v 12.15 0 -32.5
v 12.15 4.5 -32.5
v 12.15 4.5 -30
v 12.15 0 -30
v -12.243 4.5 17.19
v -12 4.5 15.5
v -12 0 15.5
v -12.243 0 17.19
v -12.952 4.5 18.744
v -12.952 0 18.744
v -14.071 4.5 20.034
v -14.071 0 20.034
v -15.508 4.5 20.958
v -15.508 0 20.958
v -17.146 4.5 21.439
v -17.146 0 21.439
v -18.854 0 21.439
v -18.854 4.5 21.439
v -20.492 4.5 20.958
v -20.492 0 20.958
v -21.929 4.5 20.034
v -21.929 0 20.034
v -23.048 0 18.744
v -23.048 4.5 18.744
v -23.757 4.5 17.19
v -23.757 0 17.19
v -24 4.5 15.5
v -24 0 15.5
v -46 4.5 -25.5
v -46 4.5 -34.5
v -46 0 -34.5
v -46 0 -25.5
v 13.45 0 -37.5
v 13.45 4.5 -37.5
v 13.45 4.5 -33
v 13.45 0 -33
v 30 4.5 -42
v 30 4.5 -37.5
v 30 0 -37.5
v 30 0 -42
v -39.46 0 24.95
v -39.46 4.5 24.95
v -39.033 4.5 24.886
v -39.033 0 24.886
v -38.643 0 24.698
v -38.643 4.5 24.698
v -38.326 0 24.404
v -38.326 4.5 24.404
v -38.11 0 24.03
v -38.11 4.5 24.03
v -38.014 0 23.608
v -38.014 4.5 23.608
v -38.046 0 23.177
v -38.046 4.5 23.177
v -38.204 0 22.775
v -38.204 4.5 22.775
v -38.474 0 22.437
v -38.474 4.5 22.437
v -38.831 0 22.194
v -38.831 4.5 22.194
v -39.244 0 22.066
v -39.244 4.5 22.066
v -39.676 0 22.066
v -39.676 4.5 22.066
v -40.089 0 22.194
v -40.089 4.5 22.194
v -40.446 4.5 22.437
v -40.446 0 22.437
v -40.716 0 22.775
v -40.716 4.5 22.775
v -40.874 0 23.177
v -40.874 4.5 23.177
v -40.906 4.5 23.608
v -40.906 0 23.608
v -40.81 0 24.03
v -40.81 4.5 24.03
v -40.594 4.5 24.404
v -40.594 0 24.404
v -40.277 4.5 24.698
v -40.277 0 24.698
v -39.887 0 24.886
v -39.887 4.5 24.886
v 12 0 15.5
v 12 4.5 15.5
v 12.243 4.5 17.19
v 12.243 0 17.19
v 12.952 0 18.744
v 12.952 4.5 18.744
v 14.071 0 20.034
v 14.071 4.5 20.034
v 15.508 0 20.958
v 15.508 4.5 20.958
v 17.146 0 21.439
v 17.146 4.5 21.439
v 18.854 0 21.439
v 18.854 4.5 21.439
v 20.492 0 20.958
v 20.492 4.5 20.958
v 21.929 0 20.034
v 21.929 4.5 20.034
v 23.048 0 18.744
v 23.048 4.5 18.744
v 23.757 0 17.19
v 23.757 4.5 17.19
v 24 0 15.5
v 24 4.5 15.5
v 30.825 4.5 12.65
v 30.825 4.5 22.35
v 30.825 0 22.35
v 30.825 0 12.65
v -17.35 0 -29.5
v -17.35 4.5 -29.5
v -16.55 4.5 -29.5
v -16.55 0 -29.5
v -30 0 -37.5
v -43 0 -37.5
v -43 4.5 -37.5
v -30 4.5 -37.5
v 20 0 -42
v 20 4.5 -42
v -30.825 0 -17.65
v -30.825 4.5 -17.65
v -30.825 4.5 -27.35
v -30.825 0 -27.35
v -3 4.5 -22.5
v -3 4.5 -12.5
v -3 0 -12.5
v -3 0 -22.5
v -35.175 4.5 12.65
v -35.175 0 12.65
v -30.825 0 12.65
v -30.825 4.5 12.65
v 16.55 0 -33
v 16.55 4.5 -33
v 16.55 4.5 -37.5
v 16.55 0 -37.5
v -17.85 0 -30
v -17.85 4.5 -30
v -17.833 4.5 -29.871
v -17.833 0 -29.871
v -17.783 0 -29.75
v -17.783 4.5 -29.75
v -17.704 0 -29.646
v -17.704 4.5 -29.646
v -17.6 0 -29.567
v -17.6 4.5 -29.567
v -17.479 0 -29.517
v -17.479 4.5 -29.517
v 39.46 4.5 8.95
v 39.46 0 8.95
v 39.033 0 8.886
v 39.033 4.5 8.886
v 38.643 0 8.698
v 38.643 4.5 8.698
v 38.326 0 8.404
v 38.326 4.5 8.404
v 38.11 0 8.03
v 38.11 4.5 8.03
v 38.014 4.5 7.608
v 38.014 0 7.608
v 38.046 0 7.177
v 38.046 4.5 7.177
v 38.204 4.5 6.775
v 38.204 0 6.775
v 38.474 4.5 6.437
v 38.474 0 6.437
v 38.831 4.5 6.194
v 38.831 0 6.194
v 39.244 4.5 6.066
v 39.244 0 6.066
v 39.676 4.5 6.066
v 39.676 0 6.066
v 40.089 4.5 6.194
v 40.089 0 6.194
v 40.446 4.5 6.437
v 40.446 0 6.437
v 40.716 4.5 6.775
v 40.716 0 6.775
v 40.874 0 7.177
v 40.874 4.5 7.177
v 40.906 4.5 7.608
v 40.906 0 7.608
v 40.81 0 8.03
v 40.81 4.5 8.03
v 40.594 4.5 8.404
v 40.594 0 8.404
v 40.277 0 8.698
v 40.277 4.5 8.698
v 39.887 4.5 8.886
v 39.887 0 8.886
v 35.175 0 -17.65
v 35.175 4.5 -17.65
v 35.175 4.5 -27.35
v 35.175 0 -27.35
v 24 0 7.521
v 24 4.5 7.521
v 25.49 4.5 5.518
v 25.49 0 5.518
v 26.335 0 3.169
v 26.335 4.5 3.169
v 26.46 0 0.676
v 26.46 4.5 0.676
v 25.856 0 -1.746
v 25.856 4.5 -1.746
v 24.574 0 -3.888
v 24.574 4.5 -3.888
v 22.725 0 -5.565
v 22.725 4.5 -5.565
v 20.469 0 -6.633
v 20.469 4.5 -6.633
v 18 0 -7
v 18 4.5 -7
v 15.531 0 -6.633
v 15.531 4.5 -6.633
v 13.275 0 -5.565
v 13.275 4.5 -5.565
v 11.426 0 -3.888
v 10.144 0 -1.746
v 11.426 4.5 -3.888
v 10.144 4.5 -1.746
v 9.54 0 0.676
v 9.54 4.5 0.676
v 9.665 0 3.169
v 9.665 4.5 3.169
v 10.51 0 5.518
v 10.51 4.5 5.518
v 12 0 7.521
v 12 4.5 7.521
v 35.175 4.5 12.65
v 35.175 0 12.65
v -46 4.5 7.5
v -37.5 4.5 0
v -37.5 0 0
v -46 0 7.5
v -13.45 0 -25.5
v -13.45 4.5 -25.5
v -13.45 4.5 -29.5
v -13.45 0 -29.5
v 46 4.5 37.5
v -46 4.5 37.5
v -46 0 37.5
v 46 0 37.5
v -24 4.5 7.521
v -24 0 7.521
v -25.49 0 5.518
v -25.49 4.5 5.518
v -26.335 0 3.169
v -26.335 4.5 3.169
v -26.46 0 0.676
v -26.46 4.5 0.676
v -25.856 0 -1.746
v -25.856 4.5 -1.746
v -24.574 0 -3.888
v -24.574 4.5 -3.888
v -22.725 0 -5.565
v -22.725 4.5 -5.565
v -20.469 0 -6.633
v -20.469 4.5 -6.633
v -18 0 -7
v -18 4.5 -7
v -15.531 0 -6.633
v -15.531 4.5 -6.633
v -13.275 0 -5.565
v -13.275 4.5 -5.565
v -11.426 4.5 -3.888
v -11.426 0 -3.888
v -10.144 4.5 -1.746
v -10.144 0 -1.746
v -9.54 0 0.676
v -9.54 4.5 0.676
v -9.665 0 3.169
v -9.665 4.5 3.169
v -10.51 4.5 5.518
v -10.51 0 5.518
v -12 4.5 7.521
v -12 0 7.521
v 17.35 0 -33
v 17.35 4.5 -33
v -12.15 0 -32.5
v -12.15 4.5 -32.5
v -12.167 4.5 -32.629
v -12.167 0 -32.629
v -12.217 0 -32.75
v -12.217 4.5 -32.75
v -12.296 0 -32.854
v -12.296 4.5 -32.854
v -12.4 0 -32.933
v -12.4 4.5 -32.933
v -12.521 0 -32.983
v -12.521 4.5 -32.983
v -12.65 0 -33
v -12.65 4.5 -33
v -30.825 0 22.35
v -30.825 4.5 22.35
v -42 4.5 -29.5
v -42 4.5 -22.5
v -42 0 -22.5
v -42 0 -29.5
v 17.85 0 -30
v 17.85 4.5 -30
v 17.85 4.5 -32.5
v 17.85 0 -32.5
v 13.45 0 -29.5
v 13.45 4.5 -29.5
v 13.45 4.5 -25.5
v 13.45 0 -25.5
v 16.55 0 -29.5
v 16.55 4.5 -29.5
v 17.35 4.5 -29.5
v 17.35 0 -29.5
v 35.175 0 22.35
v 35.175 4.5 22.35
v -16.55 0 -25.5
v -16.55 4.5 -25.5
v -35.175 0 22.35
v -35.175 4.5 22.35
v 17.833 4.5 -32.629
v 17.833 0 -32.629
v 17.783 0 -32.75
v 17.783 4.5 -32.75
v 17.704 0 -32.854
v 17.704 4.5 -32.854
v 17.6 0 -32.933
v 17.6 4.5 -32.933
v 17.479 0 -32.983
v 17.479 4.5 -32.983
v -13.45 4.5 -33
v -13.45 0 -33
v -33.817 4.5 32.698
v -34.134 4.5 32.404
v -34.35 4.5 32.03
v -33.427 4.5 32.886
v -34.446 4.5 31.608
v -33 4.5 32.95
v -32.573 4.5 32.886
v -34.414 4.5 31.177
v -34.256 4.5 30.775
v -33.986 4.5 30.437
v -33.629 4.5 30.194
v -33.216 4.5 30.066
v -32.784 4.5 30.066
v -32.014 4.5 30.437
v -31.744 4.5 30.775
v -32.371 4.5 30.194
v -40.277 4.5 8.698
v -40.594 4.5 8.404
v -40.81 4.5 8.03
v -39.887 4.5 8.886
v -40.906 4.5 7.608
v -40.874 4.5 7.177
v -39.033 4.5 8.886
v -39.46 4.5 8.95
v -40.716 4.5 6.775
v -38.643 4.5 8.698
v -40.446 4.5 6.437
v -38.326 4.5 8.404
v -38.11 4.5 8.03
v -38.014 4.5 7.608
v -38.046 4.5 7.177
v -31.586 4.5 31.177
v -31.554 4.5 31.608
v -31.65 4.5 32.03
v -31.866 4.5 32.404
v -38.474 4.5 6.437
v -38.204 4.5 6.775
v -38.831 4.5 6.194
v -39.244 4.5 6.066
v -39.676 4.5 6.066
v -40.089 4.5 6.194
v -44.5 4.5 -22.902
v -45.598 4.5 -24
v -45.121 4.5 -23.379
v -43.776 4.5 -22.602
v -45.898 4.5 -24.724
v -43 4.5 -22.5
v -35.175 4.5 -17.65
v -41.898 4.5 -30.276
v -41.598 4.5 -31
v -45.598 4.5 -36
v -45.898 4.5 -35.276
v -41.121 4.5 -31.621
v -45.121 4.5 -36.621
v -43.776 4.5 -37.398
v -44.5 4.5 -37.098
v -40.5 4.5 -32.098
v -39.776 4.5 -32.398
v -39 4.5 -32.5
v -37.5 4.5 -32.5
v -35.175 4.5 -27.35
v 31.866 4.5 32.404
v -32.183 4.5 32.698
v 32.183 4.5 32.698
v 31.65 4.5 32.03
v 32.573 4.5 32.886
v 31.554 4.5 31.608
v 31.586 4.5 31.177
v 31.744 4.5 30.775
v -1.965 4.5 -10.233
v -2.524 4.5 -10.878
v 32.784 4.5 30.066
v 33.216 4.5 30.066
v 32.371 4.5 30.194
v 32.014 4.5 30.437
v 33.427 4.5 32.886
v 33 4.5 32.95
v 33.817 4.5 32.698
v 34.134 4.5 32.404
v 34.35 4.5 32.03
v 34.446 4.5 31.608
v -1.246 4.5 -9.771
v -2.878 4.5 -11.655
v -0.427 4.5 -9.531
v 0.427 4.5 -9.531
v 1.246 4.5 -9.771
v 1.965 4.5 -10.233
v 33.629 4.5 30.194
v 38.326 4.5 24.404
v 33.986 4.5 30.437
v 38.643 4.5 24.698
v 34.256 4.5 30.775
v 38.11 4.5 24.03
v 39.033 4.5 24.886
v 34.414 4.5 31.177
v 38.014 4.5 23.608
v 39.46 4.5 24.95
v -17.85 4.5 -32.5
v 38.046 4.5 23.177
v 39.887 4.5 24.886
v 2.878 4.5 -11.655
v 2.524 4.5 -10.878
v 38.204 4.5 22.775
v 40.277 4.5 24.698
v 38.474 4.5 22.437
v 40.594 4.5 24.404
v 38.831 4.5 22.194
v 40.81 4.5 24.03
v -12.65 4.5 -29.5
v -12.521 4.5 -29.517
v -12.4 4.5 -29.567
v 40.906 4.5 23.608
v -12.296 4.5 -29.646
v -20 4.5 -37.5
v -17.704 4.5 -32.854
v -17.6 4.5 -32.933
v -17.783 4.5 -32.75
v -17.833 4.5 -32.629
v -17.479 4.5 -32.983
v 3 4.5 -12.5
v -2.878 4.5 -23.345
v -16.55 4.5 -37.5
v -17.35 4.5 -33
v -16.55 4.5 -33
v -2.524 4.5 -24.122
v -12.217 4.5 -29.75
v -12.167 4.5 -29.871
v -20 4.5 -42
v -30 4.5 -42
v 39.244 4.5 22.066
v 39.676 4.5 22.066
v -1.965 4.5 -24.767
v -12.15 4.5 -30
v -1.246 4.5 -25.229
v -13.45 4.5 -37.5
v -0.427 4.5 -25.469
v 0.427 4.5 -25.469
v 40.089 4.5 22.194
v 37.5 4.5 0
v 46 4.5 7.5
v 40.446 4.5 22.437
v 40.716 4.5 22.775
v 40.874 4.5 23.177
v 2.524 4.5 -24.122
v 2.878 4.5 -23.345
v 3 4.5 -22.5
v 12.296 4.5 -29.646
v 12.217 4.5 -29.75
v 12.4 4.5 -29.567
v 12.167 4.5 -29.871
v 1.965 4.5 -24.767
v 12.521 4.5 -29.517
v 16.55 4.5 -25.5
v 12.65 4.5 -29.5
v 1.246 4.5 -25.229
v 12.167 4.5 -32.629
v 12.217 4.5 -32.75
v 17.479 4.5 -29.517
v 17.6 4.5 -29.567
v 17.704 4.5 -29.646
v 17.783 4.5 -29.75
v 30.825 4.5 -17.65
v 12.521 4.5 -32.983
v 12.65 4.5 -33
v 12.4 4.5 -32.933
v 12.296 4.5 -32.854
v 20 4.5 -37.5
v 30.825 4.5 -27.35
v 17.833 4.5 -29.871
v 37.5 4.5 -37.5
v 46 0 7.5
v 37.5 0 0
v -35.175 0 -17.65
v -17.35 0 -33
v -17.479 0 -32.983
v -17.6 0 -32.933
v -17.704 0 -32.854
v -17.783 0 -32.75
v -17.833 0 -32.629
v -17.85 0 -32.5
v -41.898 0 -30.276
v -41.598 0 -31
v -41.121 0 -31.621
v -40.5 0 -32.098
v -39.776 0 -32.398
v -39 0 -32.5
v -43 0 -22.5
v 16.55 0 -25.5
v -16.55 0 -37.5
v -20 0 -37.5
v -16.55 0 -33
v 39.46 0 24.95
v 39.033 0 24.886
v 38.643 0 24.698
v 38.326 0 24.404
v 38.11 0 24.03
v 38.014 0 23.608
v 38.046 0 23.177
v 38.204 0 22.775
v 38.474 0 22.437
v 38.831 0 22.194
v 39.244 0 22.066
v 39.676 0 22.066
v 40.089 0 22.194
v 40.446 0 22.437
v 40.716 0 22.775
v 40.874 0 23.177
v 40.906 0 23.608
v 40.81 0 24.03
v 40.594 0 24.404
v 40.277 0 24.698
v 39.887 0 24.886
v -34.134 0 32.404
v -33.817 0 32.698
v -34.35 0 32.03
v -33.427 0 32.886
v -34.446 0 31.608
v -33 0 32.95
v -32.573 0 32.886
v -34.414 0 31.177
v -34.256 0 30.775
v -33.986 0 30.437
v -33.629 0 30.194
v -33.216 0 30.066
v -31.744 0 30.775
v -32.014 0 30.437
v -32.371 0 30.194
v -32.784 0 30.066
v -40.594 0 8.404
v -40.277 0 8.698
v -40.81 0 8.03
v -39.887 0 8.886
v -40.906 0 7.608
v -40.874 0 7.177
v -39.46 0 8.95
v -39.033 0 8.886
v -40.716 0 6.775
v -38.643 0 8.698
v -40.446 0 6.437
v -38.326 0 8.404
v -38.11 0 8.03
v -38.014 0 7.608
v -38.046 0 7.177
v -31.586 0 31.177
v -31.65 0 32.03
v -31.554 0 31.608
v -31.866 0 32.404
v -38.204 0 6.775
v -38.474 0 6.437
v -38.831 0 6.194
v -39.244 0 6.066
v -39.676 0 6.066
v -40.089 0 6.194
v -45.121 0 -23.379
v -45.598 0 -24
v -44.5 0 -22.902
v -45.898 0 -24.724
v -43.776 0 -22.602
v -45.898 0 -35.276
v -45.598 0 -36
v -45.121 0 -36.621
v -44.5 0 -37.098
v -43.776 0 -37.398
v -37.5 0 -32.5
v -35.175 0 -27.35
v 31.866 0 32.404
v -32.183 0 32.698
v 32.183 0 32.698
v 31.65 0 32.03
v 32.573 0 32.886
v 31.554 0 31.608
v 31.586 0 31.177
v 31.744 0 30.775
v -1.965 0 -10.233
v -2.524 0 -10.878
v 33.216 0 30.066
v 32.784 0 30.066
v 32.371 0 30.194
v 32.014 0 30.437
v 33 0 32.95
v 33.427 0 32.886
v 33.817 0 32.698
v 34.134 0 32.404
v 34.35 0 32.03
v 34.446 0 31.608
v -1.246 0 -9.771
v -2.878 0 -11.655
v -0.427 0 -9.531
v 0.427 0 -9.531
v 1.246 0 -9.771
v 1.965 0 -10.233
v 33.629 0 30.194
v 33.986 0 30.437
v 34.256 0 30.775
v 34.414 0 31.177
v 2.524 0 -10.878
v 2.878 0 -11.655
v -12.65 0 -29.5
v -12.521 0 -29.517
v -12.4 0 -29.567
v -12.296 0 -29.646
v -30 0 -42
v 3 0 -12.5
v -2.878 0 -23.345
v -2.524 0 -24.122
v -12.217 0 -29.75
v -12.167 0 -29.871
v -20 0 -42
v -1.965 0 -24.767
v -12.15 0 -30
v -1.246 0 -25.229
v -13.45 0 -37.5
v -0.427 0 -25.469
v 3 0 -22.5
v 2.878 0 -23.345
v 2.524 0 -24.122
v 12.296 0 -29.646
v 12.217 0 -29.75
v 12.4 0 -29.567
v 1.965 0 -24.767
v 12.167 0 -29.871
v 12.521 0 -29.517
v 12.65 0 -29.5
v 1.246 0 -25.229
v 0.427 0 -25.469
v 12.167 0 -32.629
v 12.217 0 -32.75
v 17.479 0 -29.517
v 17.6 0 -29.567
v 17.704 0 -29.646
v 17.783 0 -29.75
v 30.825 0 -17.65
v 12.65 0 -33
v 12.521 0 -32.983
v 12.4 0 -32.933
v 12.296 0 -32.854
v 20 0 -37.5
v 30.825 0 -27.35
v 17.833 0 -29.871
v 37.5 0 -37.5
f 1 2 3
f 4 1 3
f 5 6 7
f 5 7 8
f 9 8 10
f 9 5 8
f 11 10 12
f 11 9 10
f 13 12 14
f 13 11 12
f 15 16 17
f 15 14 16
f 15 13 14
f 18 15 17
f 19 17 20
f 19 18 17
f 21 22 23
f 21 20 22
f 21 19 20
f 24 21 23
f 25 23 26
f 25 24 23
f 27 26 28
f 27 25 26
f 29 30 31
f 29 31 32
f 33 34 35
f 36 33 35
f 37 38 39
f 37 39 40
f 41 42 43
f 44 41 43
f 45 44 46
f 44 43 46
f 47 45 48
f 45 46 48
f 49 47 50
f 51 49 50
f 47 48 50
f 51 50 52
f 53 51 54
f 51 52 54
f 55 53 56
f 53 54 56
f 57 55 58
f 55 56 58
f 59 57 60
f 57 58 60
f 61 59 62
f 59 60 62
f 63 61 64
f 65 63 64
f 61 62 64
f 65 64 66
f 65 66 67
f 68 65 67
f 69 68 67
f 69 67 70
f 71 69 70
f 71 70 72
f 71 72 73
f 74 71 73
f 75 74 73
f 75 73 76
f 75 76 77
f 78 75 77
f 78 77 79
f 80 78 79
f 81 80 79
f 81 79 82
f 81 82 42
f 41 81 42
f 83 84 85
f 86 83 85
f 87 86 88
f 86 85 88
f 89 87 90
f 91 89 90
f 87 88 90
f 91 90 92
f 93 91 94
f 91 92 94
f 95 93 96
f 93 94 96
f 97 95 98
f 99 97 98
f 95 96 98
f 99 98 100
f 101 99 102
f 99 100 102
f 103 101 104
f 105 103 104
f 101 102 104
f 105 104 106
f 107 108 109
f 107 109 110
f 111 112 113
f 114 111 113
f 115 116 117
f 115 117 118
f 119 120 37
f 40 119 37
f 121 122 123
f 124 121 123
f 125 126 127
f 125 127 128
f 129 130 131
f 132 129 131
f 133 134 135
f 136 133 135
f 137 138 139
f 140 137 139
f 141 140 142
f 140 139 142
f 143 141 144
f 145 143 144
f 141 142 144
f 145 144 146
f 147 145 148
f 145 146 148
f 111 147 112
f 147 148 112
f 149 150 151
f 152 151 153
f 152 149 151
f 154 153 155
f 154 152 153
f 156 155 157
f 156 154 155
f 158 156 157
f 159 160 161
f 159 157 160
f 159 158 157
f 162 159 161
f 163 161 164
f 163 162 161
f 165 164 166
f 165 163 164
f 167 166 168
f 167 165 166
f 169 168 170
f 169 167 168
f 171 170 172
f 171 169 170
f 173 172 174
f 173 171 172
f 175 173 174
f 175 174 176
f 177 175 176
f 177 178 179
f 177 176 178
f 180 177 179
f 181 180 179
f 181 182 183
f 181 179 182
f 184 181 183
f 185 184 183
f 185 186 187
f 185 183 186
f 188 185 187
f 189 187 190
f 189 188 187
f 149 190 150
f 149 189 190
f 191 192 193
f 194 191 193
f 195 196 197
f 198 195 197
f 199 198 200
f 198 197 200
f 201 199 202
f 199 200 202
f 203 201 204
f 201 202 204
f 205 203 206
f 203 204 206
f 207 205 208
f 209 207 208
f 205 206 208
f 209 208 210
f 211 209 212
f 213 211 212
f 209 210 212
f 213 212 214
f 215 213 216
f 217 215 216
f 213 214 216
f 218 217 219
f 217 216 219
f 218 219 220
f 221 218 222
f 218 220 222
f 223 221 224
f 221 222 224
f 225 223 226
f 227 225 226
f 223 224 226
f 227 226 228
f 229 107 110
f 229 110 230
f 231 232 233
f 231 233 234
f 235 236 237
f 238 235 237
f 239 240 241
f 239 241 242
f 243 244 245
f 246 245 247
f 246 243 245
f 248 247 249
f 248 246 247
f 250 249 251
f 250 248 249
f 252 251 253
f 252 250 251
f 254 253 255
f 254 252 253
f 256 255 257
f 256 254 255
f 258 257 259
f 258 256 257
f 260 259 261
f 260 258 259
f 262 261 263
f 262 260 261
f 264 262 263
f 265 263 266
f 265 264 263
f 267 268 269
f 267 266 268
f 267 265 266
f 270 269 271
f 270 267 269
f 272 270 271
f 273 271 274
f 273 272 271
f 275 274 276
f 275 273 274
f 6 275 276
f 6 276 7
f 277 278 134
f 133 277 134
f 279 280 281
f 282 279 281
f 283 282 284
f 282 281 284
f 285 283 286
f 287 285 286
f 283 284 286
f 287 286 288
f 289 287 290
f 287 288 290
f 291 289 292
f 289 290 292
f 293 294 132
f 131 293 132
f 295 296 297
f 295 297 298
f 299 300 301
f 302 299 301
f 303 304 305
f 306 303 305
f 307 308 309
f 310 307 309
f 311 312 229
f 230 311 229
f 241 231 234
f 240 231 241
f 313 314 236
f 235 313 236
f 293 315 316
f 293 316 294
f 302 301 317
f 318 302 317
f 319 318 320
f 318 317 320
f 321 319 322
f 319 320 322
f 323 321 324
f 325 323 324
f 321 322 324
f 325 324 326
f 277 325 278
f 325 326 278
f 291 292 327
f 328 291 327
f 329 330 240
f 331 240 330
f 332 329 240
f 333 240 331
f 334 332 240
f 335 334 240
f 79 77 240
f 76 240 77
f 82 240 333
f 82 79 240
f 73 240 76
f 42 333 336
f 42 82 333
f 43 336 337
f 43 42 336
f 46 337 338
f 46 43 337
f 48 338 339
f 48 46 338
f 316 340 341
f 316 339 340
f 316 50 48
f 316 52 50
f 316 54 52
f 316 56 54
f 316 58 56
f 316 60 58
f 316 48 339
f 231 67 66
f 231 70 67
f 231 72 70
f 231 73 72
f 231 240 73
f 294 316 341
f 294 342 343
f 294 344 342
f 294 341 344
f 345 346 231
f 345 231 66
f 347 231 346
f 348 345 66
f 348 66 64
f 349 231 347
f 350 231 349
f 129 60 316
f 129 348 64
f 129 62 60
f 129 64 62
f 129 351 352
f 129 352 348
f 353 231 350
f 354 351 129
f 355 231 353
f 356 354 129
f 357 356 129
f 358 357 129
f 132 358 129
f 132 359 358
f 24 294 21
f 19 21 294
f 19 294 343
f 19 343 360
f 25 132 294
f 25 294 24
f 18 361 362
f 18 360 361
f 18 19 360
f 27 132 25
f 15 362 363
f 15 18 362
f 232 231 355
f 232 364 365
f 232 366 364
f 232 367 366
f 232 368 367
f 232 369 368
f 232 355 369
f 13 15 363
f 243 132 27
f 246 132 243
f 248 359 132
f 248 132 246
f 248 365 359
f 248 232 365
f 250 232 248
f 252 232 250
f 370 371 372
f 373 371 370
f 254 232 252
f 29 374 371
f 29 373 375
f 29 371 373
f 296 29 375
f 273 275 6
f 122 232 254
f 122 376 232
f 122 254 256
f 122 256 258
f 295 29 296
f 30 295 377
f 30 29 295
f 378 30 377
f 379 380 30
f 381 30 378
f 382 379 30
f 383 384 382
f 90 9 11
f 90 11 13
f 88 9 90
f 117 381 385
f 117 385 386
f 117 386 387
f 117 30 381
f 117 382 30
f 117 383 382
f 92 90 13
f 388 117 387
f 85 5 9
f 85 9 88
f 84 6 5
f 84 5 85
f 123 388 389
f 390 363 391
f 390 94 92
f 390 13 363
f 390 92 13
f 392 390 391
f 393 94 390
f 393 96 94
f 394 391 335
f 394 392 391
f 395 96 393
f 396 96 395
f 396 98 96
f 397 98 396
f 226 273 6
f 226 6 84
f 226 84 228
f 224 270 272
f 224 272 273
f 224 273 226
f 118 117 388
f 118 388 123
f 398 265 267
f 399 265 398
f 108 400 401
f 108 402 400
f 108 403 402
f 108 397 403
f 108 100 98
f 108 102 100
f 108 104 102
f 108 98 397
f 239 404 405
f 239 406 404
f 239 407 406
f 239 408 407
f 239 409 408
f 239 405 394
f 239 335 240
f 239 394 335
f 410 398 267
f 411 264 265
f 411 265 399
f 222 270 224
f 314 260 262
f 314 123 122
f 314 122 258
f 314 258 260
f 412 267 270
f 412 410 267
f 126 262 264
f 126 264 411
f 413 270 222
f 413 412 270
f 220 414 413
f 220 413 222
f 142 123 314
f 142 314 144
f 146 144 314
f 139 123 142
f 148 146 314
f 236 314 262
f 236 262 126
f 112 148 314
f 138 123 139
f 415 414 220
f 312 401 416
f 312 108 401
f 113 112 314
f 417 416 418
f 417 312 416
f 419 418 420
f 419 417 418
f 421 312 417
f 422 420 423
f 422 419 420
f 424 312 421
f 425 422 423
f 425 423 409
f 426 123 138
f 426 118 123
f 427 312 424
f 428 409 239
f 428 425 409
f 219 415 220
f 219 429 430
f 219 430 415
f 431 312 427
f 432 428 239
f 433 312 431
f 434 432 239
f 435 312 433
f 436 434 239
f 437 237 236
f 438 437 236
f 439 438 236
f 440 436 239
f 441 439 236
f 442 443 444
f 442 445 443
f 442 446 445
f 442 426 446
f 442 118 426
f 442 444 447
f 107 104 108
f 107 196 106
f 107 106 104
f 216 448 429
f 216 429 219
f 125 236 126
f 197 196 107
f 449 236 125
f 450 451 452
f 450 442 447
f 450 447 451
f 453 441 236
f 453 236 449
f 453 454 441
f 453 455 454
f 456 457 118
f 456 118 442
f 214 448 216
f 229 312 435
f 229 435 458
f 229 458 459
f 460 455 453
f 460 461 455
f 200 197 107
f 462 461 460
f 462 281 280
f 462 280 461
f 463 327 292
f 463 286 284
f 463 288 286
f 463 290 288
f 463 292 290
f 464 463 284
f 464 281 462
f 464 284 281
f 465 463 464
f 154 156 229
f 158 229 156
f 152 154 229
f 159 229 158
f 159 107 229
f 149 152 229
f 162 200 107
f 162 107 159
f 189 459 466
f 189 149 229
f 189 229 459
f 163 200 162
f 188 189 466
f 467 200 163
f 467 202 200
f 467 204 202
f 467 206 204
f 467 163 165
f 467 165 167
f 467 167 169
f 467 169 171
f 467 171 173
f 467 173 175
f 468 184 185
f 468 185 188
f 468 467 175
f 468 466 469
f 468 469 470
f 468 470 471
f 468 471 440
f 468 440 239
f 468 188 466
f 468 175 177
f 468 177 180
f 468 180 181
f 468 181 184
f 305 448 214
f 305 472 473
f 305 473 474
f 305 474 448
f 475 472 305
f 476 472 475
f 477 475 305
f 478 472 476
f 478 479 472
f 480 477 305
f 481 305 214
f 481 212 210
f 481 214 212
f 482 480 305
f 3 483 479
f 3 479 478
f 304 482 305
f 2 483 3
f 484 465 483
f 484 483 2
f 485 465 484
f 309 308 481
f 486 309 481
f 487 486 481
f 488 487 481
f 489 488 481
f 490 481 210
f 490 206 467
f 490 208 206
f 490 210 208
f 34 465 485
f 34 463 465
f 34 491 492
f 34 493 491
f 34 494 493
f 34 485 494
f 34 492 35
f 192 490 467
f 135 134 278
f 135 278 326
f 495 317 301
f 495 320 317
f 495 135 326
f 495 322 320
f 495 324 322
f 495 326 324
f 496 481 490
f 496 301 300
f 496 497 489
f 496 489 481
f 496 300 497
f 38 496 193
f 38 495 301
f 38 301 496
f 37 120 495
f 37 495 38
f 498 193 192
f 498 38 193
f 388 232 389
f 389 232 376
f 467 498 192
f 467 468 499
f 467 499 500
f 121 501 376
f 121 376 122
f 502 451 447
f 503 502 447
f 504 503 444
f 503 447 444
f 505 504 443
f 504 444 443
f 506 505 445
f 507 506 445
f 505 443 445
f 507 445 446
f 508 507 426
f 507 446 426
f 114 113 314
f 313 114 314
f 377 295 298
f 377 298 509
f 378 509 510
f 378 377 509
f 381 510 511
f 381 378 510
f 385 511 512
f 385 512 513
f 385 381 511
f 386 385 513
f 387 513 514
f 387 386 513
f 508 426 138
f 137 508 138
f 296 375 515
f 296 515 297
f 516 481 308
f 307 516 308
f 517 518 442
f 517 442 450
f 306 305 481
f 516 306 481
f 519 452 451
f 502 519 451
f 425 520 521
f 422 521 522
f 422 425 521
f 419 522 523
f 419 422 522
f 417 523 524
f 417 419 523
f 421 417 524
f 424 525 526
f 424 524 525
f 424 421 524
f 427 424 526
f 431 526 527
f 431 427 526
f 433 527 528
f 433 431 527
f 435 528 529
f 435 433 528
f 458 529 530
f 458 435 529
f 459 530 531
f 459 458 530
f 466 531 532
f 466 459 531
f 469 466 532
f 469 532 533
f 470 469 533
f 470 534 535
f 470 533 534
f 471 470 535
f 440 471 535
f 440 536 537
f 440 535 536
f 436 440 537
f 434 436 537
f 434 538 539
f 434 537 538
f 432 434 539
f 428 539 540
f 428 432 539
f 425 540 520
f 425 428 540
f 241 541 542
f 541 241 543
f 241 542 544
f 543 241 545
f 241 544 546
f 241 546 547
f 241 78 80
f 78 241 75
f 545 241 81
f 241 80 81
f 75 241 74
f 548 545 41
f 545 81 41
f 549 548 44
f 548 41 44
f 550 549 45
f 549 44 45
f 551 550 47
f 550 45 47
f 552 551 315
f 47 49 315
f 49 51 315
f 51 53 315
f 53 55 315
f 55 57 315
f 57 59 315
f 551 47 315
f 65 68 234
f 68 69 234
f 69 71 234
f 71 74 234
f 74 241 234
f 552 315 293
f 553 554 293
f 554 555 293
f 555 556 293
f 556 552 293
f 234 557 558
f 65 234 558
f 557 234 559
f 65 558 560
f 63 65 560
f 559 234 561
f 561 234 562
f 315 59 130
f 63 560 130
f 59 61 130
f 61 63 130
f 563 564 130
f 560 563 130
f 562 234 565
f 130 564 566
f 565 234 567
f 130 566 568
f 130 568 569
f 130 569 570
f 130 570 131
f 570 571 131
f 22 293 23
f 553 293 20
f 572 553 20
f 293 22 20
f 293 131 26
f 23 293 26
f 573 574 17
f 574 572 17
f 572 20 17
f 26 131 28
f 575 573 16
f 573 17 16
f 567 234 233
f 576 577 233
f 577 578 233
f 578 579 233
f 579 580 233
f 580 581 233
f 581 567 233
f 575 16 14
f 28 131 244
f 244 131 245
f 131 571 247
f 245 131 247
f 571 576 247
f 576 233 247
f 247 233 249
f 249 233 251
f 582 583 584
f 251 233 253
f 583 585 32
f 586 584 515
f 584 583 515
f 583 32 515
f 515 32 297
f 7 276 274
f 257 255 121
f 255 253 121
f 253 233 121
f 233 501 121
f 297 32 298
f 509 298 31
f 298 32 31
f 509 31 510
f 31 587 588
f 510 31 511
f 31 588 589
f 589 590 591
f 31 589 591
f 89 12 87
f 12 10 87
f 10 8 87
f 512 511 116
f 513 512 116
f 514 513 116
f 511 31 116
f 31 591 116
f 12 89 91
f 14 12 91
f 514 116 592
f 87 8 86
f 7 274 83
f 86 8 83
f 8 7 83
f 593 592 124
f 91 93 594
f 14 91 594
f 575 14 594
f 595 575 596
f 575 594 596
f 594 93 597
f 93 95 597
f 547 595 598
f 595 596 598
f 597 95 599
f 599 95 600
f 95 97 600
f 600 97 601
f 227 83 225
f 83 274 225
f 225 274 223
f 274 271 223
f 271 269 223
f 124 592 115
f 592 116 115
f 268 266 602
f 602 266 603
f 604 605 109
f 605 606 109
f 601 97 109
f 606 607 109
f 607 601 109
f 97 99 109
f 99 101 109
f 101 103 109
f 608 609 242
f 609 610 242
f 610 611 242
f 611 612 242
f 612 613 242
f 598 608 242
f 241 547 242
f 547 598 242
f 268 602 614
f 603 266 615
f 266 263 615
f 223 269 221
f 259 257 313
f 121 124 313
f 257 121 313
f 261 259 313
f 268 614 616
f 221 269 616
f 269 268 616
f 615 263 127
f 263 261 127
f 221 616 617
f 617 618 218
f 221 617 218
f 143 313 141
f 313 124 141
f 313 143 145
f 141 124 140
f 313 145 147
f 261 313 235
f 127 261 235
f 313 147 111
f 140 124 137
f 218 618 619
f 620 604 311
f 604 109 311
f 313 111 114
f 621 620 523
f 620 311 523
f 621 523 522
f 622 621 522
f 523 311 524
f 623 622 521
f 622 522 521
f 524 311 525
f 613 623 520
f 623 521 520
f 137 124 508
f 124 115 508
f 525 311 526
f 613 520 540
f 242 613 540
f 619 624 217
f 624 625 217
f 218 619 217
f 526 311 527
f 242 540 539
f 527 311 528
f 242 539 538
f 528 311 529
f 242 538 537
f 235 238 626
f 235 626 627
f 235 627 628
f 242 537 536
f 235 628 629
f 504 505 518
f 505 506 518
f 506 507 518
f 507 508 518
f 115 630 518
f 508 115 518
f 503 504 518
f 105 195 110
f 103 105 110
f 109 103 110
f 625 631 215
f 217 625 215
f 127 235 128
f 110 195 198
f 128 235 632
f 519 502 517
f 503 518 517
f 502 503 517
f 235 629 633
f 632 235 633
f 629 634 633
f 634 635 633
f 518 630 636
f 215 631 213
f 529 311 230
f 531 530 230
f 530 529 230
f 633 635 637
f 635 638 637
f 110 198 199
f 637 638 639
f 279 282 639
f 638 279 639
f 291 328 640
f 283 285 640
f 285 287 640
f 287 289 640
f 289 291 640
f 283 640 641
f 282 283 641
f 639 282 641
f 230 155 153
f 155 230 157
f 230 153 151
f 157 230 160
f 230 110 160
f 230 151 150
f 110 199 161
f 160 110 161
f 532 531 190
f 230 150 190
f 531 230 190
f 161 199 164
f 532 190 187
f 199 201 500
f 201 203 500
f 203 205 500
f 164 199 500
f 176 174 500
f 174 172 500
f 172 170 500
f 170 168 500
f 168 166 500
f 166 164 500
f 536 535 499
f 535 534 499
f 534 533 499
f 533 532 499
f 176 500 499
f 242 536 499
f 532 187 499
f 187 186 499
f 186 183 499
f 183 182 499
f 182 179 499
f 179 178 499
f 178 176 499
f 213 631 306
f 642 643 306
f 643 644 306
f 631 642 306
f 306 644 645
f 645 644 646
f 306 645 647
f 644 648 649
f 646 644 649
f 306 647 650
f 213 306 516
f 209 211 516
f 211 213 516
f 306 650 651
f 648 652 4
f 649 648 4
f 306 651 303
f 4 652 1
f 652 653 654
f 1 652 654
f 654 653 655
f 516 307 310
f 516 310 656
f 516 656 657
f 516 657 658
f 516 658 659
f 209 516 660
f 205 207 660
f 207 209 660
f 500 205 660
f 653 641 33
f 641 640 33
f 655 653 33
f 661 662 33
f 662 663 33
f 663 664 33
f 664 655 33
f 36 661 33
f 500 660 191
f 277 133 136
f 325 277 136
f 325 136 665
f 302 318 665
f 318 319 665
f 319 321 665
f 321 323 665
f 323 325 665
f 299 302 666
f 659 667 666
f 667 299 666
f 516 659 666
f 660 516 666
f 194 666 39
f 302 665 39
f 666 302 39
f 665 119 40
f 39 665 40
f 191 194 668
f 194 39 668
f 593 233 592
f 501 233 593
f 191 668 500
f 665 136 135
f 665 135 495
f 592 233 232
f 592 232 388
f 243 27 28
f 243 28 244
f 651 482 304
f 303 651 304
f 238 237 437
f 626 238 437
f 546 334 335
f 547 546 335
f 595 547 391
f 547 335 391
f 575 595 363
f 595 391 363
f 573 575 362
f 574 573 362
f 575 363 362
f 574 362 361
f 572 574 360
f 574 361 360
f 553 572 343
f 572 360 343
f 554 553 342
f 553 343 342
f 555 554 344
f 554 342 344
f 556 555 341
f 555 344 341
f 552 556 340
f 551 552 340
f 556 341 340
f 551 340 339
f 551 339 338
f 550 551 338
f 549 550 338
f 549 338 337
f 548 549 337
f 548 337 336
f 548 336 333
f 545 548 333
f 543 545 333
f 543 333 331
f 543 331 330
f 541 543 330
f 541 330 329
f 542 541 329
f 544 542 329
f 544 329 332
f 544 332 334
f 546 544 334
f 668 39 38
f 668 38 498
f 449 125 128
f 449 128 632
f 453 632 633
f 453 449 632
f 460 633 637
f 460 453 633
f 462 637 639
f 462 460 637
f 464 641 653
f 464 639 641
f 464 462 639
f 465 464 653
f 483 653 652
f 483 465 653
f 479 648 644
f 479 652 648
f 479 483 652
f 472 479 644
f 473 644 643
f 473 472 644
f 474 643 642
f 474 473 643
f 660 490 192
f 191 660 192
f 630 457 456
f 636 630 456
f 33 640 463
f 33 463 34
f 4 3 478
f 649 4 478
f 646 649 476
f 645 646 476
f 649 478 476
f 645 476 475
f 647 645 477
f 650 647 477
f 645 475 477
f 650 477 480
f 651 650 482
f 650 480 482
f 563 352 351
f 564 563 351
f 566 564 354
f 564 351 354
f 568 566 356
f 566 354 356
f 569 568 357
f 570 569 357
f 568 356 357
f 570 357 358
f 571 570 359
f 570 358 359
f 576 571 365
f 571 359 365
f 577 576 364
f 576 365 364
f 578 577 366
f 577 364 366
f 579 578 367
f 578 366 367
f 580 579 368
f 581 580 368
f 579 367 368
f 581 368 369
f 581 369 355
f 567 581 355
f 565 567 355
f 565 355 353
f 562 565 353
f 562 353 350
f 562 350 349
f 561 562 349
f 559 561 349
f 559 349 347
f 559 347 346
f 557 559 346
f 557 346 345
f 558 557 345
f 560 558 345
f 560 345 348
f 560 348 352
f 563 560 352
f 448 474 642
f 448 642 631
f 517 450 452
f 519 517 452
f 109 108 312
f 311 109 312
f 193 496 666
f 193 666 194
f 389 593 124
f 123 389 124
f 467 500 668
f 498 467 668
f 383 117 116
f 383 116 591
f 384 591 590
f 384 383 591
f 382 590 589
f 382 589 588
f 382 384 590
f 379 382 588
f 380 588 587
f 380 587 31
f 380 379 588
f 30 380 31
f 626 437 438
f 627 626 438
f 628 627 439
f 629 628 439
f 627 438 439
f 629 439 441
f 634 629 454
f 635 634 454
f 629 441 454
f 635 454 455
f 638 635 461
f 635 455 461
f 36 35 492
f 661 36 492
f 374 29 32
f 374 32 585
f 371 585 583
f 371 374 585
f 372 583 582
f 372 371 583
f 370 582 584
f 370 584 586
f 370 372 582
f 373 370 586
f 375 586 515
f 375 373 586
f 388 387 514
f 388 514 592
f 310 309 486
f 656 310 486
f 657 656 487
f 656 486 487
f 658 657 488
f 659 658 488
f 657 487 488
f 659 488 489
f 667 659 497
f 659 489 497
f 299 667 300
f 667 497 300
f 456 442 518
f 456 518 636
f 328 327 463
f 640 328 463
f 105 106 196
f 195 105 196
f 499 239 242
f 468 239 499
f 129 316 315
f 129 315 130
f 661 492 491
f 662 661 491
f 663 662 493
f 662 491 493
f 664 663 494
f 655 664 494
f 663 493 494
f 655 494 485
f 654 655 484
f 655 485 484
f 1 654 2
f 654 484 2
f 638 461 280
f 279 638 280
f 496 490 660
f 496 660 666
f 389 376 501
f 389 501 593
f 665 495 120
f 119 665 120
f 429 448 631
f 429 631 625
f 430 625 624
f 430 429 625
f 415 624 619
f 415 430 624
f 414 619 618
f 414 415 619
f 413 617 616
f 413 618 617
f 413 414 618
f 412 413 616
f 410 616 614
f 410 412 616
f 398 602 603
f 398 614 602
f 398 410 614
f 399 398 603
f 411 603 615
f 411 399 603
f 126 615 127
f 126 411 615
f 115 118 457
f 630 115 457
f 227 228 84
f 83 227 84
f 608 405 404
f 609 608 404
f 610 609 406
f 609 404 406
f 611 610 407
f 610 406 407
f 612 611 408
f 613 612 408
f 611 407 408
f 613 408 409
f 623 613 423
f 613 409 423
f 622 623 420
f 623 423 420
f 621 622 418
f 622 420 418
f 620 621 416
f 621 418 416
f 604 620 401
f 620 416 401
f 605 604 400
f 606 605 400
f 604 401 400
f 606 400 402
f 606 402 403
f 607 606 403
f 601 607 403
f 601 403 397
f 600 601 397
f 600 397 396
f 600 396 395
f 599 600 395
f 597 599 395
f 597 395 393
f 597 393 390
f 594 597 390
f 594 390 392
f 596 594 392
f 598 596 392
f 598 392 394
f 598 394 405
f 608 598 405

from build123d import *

# Parameters (mm, degrees)
SKETCH1_W            = 75
SKETCH1_H            = 75
MAINSHAPE_DEPTH      = 4.5
SKETCH5_W            = 4.35
SKETCH5_H            = 9.7
CUT_EXTRUDE3_DEPTH   = 54.223584998
CUT_EXTRUDE4_DEPTH   = 54.223584998
BOSS_EXTRUDE2_DEPTH  = 4.5
SKETCH8_R            = 1.45
CUT_EXTRUDE6_DEPTH   = 60.51890456
SKETCH11_W           = 10
SKETCH11_H           = 4.5
REARTABS_DEPTH       = 4.5
FRONTSCREWSLOT_DEPTH = 63.451981554
SKETCH14_R           = 1.45
BRACESCREWS_DEPTH    = 63.451981554
WIRINGSLOT_DEPTH     = 63.451981554
BOSS_EXTRUDE4_DEPTH  = 4.5


with BuildPart() as part:
    # Sketch1 → MainShape (new body)
    with BuildSketch(Plane(origin=(0, 0, 0), x_dir=(1, 0, 0), z_dir=(0, 1, 0))):
        Rectangle(SKETCH1_W, SKETCH1_H)
    extrude(amount=MAINSHAPE_DEPTH)

    # Sketch5 → Cut-Extrude3 (cut, through all)
    with BuildSketch(Plane(origin=(0, 4.5, 0), x_dir=(1, 0, 0), z_dir=(0, 1, 0))):
        with Locations((33, 22.5)):
            Rectangle(SKETCH5_W, SKETCH5_H)
        with Locations((-33, 22.5)):
            Rectangle(SKETCH5_W, SKETCH5_H)
        with Locations((-33, -17.5)):
            Rectangle(SKETCH5_W, SKETCH5_H)
        with Locations((33, -17.5)):
            Rectangle(SKETCH5_W, SKETCH5_H)
    extrude(amount=-CUT_EXTRUDE3_DEPTH, mode=Mode.SUBTRACT)

    # Sketch6 → Cut-Extrude4 (cut, through all)
    with BuildSketch(Plane(origin=(0, 4.5, 0), x_dir=(1, 0, 0), z_dir=(0, 1, 0))):
        with BuildLine():
            Line((-24, -15.5), (-24, -7.520797289))
            ThreePointArc((-24, -7.520797289), (-18, 7), (-12, -7.520797289))
            Line((-12, -7.520797289), (-12, -15.5))
            ThreePointArc((-12, -15.5), (-18, -21.5), (-24, -15.5))
        make_face()
    cut_extrude4 = extrude(amount=-CUT_EXTRUDE4_DEPTH, mode=Mode.SUBTRACT)

    # Sketch13 → Boss-Extrude2 (add, through all)
    with BuildSketch(Plane(origin=(0, 4.5, 0), x_dir=(1, 0, 0), z_dir=(0, 1, 0))):
        Polygon((-37.5, -37.5), (-37.5, 0), (-46, -7.5), (-46, -37.5), align=None)
        Polygon((37.5, 0), (37.5, -37.5), (46, -37.5), (46, -7.5), align=None)
    extrude(amount=-BOSS_EXTRUDE2_DEPTH)

    # Sketch8 → Cut-Extrude6 (cut, through all)
    with BuildSketch(Plane(origin=(0, 4.5, 0), x_dir=(1, 0, 0), z_dir=(0, 1, 0))):
        with Locations(Location((-39.46, -7.5, 0), (0, 0, 270))):
            Circle(SKETCH8_R)
        with Locations(Location((-39.46, -23.5, 0), (0, 0, 270))):
            Circle(SKETCH8_R)
    cut_extrude6 = extrude(amount=-CUT_EXTRUDE6_DEPTH, mode=Mode.SUBTRACT)

    # Mirror1: Cut-Extrude4, Cut-Extrude6 across plane
    add(cut_extrude4.mirror(Plane(origin=(0, 0, 0), x_dir=(0, 0, 1), z_dir=(1, 0, 0))), mode=Mode.SUBTRACT)
    add(cut_extrude6.mirror(Plane(origin=(0, 0, 0), x_dir=(0, 0, 1), z_dir=(1, 0, 0))), mode=Mode.SUBTRACT)

    # Sketch11 → RearTabs (add, through all)
    with BuildSketch(Plane(origin=(0, 4.5, 0), x_dir=(1, 0, 0), z_dir=(0, 1, 0))):
        with Locations((-25, 39.75)):
            Rectangle(SKETCH11_W, SKETCH11_H)
        with Locations((25, 39.75)):
            Rectangle(SKETCH11_W, SKETCH11_H)
    extrude(amount=-REARTABS_DEPTH)

    # Sketch12 → FrontScrewSlot (cut, through all)
    with BuildSketch(Plane(origin=(0, 4.5, 0), x_dir=(1, 0, 0), z_dir=(0, 1, 0))):
        with BuildLine():
            Line((-13.45, 37.5), (-16.55, 37.5))
            Line((-16.55, 37.5), (-16.55, 33))
            Line((-16.55, 33), (-17.35, 33))
            ThreePointArc((-17.35, 33), (-17.703553391, 32.853553391), (-17.85, 32.5))
            Line((-17.85, 32.5), (-17.85, 30))
            ThreePointArc((-17.85, 30), (-17.703553391, 29.646446609), (-17.35, 29.5))
            Line((-17.35, 29.5), (-16.55, 29.5))
            Line((-16.55, 29.5), (-16.55, 25.5))
            Line((-16.55, 25.5), (-13.45, 25.5))
            Line((-13.45, 25.5), (-13.45, 29.5))
            Line((-13.45, 29.5), (-12.65, 29.5))
            ThreePointArc((-12.65, 29.5), (-12.296446609, 29.646446609), (-12.15, 30))
            Line((-12.15, 30), (-12.15, 32.5))
            ThreePointArc((-12.15, 32.5), (-12.296446609, 32.853553391), (-12.65, 33))
            Line((-12.65, 33), (-13.45, 33))
            Line((-13.45, 33), (-13.45, 37.5))
        make_face()
        with BuildLine():
            Line((13.45, 37.5), (13.45, 33))
            Line((13.45, 33), (12.65, 33))
            ThreePointArc((12.65, 33), (12.296446609, 32.853553391), (12.15, 32.5))
            Line((12.15, 32.5), (12.15, 30))
            ThreePointArc((12.15, 30), (12.296446609, 29.646446609), (12.65, 29.5))
            Line((12.65, 29.5), (13.45, 29.5))
            Line((13.45, 29.5), (13.45, 25.5))
            Line((13.45, 25.5), (16.55, 25.5))
            Line((16.55, 25.5), (16.55, 29.5))
            Line((16.55, 29.5), (17.35, 29.5))
            ThreePointArc((17.35, 29.5), (17.703553391, 29.646446609), (17.85, 30))
            Line((17.85, 30), (17.85, 32.5))
            ThreePointArc((17.85, 32.5), (17.703553391, 32.853553391), (17.35, 33))
            Line((17.35, 33), (16.55, 33))
            Line((16.55, 33), (16.55, 37.5))
            Line((16.55, 37.5), (13.45, 37.5))
        make_face()
    extrude(amount=-FRONTSCREWSLOT_DEPTH, mode=Mode.SUBTRACT)

    # Sketch14 → BraceScrews (cut, through all)
    with BuildSketch(Plane(origin=(0, 4.5, 0), x_dir=(1, 0, 0), z_dir=(0, 1, 0))):
        with Locations(Location((-33, -31.5, 0), (0, 0, 270))):
            Circle(SKETCH14_R)
        with Locations(Location((33, -31.5, 0), (0, 0, 270))):
            Circle(SKETCH14_R)
    extrude(amount=-BRACESCREWS_DEPTH, mode=Mode.SUBTRACT)

    # Sketch16 → WiringSlot (cut, through all)
    with BuildSketch(Plane(origin=(0, 4.5, 0), x_dir=(1, 0, 0), z_dir=(0, 1, 0))):
        with BuildLine():
            Line((3, 22.5), (3, 12.5))
            ThreePointArc((3, 12.5), (0, 9.5), (-3, 12.5))
            Line((-3, 12.5), (-3, 22.5))
            ThreePointArc((-3, 22.5), (0, 25.5), (3, 22.5))
        make_face()
    extrude(amount=-WIRINGSLOT_DEPTH, mode=Mode.SUBTRACT)

    # Sketch21 → Boss-Extrude4 (add, through all)
    with BuildSketch(Plane(origin=(0, 4.5, 0), x_dir=(1, 0, 0), z_dir=(0, 1, 0))):
        with BuildLine():
            Line((-37, 37.5), (-43, 37.5))
            ThreePointArc((-43, 37.5), (-45.121320344, 36.621320344), (-46, 34.5))
            Line((-46, 34.5), (-46, 25.5))
            ThreePointArc((-46, 25.5), (-45.121320344, 23.378679656), (-43, 22.5))
            Line((-43, 22.5), (-42, 22.5))
            Line((-42, 22.5), (-42, 29.5))
            ThreePointArc((-42, 29.5), (-41.121320344, 31.621320344), (-39, 32.5))
            Line((-39, 32.5), (-37, 32.5))
            Line((-37, 32.5), (-37, 37.5))
        make_face()
    extrude(amount=-BOSS_EXTRUDE4_DEPTH)


solid = part.part
